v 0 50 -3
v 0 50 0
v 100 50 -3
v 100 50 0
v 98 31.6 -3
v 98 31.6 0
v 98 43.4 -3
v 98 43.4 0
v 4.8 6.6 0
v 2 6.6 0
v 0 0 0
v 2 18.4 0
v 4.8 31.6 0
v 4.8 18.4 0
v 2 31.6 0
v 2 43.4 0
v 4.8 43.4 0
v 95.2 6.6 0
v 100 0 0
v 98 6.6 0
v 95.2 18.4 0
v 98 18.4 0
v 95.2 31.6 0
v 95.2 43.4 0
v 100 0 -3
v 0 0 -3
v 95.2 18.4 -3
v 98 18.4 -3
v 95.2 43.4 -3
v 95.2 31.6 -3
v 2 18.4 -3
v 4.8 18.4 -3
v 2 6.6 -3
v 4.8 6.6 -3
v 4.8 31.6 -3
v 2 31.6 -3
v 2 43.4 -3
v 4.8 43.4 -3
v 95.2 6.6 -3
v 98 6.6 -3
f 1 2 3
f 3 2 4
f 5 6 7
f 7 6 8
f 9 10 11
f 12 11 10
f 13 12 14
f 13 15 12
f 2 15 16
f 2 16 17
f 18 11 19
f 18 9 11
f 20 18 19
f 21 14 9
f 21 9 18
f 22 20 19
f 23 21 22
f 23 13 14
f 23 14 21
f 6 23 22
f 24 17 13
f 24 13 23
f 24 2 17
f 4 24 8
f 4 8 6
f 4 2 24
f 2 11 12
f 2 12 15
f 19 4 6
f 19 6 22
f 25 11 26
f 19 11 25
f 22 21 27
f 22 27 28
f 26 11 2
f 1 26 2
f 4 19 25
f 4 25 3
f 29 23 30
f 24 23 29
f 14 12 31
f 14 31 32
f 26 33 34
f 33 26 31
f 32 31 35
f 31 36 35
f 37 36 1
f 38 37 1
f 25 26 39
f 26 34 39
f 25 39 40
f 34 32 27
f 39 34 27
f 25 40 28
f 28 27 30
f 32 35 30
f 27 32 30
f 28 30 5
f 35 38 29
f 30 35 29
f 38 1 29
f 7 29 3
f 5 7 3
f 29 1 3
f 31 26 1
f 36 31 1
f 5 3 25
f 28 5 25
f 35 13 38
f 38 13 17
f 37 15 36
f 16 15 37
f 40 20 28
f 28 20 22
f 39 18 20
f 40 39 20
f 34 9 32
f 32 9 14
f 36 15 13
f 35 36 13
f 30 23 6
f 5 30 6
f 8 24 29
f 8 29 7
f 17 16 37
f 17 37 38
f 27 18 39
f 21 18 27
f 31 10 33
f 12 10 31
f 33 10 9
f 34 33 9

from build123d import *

# Parameters (mm, degrees)
SKETCH_1_W      = 100
SKETCH_1_H      = 50
SKETCH_1_W_2    = 2.8
SKETCH_1_H_2    = 11.8
EXTRUDE_1_DEPTH = 3


with BuildPart() as part:
    # Эскиз1 → Бобышка-Вытянуть1 (new body)
    with BuildSketch(Plane.XY):
        with Locations((50, 25)):
            Rectangle(SKETCH_1_W, SKETCH_1_H)
        with Locations((3.4, 37.5)):
            Rectangle(SKETCH_1_W_2, SKETCH_1_H_2, mode=Mode.SUBTRACT)
        with Locations((3.4, 12.5)):
            Rectangle(SKETCH_1_W_2, SKETCH_1_H_2, mode=Mode.SUBTRACT)
        with Locations((96.6, 12.5)):
            Rectangle(SKETCH_1_W_2, SKETCH_1_H_2, mode=Mode.SUBTRACT)
        with Locations((96.6, 37.5)):
            Rectangle(SKETCH_1_W_2, SKETCH_1_H_2, mode=Mode.SUBTRACT)
    extrude(amount=-EXTRUDE_1_DEPTH)


solid = part.part
